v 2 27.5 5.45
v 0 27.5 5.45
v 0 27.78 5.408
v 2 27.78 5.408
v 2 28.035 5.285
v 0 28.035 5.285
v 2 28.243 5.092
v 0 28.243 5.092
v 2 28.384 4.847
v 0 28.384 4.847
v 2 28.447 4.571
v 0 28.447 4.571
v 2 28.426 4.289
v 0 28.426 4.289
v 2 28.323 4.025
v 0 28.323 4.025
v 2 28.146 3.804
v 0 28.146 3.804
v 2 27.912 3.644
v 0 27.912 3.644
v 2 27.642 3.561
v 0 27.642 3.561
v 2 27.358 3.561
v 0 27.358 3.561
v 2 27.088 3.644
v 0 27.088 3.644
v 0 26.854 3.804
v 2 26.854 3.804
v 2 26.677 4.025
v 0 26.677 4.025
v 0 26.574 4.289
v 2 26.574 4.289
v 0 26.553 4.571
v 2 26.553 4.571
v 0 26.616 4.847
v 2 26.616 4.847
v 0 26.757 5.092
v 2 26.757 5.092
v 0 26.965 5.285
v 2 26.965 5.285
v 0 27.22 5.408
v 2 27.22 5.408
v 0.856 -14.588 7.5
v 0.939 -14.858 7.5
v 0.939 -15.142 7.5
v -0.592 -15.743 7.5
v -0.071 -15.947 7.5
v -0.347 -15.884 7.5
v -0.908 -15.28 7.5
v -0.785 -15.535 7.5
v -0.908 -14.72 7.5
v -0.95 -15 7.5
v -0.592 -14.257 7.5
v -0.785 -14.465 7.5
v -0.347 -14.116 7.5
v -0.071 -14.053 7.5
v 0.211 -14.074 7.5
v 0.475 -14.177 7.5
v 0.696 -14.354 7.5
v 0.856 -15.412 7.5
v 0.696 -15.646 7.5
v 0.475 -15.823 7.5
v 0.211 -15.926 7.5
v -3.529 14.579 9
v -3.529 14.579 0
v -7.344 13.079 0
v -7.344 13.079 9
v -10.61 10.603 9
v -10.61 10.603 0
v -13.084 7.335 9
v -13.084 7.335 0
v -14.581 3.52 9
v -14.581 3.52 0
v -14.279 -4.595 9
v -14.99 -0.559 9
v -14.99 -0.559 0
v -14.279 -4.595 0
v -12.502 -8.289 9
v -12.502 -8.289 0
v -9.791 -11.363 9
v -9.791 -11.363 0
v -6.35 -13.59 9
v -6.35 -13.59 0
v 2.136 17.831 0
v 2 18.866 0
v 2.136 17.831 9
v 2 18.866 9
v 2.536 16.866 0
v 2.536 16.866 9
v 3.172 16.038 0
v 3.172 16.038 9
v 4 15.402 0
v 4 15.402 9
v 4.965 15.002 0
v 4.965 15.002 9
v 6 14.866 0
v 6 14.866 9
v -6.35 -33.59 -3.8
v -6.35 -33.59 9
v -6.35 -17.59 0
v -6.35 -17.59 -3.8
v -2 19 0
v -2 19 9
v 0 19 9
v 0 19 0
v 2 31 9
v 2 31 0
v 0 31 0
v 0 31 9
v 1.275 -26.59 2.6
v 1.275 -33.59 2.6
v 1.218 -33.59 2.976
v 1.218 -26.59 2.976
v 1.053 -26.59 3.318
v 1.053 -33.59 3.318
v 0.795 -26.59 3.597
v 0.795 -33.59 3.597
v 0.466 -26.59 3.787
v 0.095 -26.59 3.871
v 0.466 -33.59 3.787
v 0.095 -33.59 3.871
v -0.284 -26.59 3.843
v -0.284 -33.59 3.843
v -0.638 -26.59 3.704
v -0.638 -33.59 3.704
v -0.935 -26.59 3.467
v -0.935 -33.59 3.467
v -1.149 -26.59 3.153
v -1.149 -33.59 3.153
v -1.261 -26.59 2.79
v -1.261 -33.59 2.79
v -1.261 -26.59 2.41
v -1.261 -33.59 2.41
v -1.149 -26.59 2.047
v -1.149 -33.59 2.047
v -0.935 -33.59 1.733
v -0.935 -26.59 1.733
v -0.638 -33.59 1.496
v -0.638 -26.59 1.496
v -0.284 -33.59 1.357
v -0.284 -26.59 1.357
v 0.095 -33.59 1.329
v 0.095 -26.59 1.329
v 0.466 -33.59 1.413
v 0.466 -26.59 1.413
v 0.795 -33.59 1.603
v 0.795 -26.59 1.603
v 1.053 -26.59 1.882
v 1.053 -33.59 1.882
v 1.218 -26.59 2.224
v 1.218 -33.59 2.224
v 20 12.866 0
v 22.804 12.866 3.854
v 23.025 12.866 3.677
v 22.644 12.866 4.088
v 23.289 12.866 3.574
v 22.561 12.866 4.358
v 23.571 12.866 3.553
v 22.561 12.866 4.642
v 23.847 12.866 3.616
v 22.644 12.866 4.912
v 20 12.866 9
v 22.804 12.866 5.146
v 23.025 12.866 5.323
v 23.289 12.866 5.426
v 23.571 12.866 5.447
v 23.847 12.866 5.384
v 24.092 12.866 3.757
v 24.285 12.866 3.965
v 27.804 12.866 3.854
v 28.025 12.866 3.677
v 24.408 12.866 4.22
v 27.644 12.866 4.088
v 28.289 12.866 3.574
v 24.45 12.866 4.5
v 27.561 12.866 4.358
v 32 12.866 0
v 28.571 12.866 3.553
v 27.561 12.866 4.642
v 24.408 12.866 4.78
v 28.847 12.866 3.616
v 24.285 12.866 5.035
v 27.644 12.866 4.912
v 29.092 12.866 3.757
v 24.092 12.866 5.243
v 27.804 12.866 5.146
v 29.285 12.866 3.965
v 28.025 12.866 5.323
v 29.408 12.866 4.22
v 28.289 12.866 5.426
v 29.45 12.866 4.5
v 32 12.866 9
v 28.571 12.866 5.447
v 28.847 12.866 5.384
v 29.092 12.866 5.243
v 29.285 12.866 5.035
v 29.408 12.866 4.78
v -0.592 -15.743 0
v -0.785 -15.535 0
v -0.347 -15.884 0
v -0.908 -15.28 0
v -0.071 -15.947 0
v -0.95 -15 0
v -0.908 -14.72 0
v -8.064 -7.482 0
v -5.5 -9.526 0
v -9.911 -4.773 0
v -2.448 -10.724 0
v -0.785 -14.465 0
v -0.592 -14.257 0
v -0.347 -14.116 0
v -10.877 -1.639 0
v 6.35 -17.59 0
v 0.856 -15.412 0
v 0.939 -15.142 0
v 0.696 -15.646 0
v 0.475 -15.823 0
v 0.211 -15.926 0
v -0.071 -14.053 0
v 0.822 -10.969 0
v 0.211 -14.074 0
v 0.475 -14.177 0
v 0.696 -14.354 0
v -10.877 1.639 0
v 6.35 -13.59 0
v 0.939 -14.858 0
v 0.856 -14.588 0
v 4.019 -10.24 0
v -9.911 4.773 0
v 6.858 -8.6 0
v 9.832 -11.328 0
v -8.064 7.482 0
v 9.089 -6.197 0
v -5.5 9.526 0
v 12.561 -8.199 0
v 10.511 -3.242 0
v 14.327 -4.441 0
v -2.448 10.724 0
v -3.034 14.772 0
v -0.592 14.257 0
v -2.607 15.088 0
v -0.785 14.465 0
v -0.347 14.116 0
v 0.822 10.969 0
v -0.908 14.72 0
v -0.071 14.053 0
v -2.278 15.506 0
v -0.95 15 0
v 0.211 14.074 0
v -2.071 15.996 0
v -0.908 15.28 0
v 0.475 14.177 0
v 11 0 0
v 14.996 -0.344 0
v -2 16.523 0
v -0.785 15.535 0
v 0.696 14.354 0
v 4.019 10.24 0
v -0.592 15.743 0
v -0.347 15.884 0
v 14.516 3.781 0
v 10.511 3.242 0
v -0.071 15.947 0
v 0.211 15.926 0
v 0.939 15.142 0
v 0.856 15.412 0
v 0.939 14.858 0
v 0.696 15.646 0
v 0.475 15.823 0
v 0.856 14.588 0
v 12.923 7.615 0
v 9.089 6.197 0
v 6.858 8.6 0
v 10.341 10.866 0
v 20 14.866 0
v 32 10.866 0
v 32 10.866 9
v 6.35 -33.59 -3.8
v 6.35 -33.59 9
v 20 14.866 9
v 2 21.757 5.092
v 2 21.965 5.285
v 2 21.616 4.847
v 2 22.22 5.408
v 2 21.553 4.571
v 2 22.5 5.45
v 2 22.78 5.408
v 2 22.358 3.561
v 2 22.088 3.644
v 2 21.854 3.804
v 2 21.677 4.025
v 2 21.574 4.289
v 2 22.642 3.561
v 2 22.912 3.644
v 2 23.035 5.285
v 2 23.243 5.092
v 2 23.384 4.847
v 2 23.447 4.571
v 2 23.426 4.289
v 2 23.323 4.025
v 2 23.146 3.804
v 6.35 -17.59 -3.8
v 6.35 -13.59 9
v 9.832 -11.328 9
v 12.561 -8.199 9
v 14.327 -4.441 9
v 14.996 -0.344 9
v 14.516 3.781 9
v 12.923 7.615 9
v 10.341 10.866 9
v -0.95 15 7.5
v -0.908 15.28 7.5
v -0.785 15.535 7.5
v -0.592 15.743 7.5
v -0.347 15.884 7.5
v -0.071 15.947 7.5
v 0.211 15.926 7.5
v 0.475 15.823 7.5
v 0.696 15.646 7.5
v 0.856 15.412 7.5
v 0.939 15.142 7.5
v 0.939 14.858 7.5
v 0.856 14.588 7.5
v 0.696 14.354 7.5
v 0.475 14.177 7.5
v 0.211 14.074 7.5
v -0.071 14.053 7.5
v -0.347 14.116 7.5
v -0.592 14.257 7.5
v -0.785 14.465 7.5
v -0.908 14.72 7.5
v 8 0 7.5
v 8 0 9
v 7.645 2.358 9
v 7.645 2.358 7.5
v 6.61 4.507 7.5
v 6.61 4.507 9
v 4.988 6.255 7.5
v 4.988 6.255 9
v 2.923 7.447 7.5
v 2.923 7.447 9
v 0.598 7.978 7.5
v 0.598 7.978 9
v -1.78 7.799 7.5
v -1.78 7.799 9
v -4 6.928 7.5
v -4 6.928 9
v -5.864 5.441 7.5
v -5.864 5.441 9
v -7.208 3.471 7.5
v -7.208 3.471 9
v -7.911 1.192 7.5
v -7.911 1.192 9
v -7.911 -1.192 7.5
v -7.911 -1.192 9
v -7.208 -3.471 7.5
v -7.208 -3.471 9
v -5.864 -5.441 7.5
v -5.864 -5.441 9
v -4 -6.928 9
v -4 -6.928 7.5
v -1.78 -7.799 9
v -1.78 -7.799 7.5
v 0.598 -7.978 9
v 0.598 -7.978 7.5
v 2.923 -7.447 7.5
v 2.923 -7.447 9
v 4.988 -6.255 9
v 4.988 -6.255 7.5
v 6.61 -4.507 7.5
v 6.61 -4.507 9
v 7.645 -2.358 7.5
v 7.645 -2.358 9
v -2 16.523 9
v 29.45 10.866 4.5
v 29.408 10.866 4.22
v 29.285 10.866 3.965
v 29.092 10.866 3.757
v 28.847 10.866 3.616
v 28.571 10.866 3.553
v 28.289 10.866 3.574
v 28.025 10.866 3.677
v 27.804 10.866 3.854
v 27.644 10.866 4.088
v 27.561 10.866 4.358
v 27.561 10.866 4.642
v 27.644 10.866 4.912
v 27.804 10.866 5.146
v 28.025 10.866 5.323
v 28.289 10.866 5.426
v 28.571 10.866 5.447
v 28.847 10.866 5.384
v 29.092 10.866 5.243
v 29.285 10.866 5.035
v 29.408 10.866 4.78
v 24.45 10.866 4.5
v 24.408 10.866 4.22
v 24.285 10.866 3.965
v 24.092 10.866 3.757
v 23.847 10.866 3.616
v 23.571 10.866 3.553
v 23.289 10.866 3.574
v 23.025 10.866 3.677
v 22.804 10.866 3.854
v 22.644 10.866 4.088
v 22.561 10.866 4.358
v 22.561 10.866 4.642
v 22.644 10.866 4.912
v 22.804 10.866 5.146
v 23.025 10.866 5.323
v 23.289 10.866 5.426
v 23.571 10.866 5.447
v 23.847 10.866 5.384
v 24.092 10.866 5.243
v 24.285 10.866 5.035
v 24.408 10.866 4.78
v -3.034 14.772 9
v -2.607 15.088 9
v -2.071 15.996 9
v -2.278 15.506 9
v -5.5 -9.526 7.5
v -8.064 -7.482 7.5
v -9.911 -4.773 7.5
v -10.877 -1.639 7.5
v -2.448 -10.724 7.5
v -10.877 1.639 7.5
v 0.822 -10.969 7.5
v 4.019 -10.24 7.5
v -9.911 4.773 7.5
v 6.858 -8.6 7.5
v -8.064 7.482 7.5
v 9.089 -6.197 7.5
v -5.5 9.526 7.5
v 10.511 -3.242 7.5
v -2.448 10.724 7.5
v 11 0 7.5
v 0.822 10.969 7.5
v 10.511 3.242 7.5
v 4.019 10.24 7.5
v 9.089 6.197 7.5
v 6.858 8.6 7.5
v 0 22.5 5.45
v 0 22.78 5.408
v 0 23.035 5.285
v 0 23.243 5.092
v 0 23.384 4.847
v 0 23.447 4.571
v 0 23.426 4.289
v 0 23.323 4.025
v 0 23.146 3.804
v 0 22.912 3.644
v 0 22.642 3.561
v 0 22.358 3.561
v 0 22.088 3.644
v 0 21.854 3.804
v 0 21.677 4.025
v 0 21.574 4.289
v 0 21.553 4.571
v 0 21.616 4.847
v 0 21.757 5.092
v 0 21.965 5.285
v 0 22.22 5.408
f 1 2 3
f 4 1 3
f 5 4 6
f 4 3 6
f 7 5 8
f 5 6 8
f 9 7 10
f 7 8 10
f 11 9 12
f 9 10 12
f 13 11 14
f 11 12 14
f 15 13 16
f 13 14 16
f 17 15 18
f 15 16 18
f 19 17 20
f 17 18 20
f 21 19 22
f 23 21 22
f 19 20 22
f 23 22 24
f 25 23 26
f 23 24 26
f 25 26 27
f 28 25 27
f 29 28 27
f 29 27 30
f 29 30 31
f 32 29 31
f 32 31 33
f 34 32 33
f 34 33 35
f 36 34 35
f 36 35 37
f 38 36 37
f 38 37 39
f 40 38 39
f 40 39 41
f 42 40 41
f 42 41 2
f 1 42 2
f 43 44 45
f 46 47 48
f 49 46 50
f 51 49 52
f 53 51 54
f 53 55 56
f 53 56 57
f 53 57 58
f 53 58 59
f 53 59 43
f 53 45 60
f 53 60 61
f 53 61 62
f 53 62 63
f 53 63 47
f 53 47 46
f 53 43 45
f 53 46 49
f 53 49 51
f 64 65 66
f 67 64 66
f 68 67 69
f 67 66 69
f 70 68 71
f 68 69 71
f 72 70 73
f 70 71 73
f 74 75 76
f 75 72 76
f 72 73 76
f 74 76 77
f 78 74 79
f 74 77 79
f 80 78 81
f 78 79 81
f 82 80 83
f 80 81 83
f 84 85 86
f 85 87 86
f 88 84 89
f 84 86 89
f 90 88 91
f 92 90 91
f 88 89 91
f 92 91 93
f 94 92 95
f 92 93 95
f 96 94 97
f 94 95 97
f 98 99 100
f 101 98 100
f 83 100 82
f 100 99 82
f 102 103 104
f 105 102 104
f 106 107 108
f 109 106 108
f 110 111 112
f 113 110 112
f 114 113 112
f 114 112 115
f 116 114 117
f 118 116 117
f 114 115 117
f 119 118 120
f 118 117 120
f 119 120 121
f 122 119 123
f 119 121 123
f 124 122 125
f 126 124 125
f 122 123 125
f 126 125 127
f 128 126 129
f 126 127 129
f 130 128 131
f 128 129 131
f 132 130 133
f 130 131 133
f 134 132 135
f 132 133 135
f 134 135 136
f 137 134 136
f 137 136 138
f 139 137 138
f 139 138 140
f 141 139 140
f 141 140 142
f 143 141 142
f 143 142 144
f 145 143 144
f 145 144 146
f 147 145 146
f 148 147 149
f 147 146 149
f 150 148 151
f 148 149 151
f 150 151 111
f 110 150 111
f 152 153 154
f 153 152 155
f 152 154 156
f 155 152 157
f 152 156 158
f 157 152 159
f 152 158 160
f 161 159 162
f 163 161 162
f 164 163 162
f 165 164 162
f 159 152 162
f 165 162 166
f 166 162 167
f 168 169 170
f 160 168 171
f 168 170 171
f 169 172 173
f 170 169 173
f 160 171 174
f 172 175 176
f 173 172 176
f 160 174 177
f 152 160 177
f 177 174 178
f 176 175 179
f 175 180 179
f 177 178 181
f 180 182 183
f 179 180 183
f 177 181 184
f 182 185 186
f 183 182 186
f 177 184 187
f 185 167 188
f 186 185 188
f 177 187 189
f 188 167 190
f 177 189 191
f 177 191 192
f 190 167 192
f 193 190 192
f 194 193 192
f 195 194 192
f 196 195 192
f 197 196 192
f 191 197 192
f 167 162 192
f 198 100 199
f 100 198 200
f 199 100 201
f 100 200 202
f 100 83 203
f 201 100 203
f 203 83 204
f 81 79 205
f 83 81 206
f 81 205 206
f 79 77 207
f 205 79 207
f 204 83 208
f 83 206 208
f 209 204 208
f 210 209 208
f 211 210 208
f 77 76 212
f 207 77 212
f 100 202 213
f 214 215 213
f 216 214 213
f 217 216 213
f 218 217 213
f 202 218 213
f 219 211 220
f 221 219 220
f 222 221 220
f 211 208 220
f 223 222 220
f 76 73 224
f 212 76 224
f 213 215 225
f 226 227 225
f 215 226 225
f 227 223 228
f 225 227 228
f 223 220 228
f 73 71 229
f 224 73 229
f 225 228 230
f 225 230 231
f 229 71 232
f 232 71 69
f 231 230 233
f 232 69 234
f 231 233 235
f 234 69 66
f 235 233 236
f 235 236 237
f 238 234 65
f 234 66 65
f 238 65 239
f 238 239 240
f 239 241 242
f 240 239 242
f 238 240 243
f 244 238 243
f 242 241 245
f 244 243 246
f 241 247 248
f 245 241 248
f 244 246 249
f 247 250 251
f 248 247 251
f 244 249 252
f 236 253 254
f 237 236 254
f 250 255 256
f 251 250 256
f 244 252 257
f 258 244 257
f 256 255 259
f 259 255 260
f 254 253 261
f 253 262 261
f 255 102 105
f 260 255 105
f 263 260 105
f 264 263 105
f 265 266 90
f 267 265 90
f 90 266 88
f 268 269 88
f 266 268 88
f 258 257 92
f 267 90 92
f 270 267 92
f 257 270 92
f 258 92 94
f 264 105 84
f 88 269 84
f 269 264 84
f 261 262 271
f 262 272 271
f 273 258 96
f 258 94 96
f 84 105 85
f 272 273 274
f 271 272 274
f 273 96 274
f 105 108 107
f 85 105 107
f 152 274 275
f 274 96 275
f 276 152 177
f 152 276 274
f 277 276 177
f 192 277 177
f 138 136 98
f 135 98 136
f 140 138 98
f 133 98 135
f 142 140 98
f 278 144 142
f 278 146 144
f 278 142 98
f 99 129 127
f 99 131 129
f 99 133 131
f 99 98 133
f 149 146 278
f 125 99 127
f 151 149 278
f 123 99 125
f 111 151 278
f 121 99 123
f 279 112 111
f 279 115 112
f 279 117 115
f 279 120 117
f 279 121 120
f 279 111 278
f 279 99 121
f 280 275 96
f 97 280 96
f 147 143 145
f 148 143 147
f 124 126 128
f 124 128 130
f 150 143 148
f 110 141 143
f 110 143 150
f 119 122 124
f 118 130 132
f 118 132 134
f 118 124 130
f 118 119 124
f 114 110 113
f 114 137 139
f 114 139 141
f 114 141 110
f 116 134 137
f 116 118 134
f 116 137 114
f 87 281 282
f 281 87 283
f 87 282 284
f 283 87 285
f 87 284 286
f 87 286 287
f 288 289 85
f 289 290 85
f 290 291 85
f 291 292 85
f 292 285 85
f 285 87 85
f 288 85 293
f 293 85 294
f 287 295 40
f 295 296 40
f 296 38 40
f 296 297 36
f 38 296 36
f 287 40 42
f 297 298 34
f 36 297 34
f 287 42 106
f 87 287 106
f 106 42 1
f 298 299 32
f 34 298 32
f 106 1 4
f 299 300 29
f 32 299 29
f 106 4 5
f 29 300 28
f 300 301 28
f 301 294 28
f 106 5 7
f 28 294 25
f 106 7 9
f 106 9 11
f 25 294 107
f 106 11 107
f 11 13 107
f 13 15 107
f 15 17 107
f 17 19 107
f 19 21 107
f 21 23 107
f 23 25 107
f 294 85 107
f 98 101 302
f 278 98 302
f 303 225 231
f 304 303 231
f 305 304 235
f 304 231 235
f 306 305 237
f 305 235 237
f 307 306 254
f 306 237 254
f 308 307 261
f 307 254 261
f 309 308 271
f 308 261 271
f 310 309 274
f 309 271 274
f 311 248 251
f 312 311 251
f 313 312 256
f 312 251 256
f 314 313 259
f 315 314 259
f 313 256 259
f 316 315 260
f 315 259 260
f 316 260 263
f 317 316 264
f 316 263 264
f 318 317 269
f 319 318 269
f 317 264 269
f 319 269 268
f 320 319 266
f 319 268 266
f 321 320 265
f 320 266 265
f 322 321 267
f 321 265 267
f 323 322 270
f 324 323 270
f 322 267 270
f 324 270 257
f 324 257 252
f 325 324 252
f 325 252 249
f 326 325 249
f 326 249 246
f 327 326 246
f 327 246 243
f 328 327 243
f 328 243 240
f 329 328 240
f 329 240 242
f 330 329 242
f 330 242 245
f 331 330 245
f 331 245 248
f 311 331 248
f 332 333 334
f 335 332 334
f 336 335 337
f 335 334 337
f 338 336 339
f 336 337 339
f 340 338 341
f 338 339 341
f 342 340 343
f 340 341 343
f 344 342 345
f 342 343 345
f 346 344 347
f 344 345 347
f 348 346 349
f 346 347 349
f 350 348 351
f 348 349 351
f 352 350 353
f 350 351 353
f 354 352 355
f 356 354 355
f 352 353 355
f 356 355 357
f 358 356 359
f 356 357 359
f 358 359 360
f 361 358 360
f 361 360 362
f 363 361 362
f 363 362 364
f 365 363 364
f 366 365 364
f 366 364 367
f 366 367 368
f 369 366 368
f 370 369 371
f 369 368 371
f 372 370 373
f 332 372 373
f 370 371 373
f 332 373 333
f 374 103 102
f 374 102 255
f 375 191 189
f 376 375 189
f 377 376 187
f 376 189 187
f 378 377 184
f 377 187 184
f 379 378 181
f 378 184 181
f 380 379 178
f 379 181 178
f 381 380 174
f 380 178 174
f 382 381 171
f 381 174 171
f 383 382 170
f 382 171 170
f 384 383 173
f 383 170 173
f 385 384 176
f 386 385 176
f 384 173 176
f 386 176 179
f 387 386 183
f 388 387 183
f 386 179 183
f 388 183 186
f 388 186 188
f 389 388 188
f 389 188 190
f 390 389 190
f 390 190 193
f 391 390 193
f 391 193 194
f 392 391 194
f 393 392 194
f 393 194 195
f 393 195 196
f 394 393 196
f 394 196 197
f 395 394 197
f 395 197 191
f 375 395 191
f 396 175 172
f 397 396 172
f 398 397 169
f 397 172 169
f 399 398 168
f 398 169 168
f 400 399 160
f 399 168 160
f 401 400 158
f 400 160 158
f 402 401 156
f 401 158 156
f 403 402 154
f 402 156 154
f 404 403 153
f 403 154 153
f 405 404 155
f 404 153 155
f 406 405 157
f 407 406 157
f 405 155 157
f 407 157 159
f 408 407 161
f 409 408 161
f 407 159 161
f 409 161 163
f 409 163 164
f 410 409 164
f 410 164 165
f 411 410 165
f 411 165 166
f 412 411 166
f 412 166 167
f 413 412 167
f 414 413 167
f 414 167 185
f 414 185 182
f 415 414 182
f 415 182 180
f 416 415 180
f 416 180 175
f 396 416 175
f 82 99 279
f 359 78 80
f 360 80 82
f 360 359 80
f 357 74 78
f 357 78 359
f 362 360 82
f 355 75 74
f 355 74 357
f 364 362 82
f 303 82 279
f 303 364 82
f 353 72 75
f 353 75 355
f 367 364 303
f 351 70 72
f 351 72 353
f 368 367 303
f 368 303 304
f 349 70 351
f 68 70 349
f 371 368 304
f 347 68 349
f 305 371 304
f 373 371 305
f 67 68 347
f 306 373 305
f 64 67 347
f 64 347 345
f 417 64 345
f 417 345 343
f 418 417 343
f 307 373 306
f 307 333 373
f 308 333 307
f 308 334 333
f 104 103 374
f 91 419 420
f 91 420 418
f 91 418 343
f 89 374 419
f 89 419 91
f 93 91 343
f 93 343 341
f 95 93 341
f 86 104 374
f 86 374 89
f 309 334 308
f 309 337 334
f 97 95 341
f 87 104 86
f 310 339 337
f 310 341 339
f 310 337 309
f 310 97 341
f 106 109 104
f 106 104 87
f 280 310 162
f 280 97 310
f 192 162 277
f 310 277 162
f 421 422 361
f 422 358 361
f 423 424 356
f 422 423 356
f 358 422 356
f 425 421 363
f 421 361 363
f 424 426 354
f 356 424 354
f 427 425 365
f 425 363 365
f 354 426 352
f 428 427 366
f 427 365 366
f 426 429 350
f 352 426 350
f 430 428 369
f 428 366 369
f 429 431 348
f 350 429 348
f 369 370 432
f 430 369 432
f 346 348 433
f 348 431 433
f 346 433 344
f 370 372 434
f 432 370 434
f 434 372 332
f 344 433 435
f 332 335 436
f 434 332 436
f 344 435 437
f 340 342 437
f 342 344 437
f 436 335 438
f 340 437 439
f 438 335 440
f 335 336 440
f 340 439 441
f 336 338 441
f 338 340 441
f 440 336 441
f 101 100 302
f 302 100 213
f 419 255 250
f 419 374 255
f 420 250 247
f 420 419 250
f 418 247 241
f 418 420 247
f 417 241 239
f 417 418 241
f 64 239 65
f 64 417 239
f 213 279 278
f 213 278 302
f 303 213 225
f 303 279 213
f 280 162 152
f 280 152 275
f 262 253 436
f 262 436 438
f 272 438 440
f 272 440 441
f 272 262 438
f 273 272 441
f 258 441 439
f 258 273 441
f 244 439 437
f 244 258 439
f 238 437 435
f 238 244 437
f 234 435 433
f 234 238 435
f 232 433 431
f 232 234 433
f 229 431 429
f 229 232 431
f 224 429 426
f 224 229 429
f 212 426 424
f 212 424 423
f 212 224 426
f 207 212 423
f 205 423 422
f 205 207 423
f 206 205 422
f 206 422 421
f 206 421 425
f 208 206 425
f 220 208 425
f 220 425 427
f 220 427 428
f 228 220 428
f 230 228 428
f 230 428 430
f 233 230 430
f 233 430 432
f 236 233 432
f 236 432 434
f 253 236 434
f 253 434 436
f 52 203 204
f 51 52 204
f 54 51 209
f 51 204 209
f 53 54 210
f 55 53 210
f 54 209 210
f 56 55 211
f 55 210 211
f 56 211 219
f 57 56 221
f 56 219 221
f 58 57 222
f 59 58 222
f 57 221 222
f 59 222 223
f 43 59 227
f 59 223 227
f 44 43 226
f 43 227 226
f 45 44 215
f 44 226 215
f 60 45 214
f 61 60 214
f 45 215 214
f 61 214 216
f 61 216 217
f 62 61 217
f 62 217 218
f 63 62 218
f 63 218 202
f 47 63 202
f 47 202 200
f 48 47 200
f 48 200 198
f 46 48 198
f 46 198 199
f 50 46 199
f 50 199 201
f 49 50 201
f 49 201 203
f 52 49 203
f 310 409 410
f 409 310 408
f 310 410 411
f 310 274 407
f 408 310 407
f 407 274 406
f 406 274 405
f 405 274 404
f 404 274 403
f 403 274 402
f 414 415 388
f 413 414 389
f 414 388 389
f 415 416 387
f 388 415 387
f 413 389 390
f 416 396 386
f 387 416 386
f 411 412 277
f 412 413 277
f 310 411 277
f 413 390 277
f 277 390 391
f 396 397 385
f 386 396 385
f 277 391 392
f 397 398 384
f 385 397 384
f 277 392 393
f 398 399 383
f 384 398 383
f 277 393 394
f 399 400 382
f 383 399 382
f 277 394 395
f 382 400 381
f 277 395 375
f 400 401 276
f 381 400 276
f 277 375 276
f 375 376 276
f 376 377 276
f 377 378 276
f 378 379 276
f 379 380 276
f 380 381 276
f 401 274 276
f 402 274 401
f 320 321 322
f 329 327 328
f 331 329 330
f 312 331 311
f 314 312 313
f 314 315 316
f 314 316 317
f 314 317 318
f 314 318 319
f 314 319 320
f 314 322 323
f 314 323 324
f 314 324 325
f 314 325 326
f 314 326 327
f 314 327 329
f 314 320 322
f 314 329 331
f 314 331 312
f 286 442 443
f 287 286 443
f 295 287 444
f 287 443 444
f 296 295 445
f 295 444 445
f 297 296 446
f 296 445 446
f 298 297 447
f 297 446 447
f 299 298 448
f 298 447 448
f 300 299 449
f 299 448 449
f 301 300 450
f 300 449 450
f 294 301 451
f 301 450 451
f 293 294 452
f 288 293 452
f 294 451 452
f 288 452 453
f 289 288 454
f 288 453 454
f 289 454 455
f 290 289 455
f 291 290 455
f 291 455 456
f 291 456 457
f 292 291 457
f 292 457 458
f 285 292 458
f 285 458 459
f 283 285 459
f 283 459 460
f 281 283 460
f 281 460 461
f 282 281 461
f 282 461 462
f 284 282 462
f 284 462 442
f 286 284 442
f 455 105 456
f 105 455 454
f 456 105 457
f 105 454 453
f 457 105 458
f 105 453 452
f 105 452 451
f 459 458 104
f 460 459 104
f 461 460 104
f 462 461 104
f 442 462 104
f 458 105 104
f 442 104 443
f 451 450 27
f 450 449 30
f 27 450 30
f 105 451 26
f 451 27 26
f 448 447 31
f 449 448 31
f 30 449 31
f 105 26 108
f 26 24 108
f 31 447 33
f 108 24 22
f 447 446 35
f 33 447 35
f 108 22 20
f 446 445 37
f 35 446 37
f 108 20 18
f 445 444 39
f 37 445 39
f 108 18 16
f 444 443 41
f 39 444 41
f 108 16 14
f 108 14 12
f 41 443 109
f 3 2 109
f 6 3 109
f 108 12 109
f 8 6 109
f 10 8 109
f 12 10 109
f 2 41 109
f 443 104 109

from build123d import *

# Parameters (mm, degrees)
SKETCH2_R           = 15
SKETCH2_R_2         = 11
BOSS_EXTRUDE1_DEPTH = 9
BOSS_EXTRUDE2_DEPTH = 9
SKETCH4_W           = 12.7
SKETCH4_H           = 16
BOSS_EXTRUDE3_DEPTH = 3.8
SKETCH5_R           = 1.275
CUT_EXTRUDE1_DEPTH  = 7
SKETCH6_R           = 11
SKETCH6_R_2         = 8
BOSS_EXTRUDE4_DEPTH = 1.5
BOSS_EXTRUDE5_DEPTH = 9
SKETCH8_W           = 12
SKETCH8_H           = 2
SKETCH8_W_2         = 2
SKETCH8_H_2         = 12
CUT_EXTRUDE2_DEPTH  = 13.8
CUT_EXTRUDE3_REACH  = 34
SKETCH9_R           = 0.95
CUT_EXTRUDE4_REACH  = 48.456
SKETCH10_R          = 0.95
FILLET1_R           = 4
FILLET3_R           = 2
SKETCH11_R          = 11
BOSS_EXTRUDE6_DEPTH = 1.5
SKETCH13_R          = 0.95
CUT_EXTRUDE5_DEPTH  = 9
FILLET2_R           = 1


with BuildPart() as part:
    # Sketch2 → Boss-Extrude1 (new body)
    with BuildSketch(Plane.XY):
        Circle(SKETCH2_R)
        Circle(SKETCH2_R_2, mode=Mode.SUBTRACT)
    extrude(amount=BOSS_EXTRUDE1_DEPTH)

    # Sketch3 → Boss-Extrude2 (add)
    with BuildSketch(Plane.XY):
        with BuildLine():
            Line((-6.35, -13.589610002), (-6.35, -33.589610002))
            Line((-6.35, -33.589610002), (6.35, -33.589610002))
            Line((6.35, -33.589610002), (6.35, -13.589610002))
            ThreePointArc((6.35, -13.589610002), (0, -15), (-6.35, -13.589610002))
        make_face()
    extrude(amount=BOSS_EXTRUDE2_DEPTH)

    # Sketch4 → Boss-Extrude3 (add)
    with BuildSketch(Plane.XY):
        with Locations((0, -25.589610002)):
            Rectangle(SKETCH4_W, SKETCH4_H)
    extrude(amount=-BOSS_EXTRUDE3_DEPTH)

    # Sketch5 → Cut-Extrude1 (cut)
    with BuildSketch(Plane.XZ.offset(33.589610002)):
        with Locations((0, 2.6)):
            Circle(SKETCH5_R)
    extrude(amount=-CUT_EXTRUDE1_DEPTH, mode=Mode.SUBTRACT)

    # Sketch6 → Boss-Extrude4 (add)
    with BuildSketch(Plane.XY.offset(9)):
        Circle(SKETCH6_R)
        Circle(SKETCH6_R_2, mode=Mode.SUBTRACT)
    extrude(amount=-BOSS_EXTRUDE4_DEPTH)

    # Sketch7 → Boss-Extrude5 (add)
    with BuildSketch(Plane.XY):
        Polygon((-2, 14.866068747), (2, 10.866068747), (32, 10.866068747), (32, 14.866068747), (2, 14.866068747), (2, 31), (-2, 31), align=None)
    extrude(amount=BOSS_EXTRUDE5_DEPTH)

    # Sketch8 → Cut-Extrude2 (cut, through all)
    with BuildSketch(Plane.XY.offset(9)):
        with Locations((26, 13.866068747)):
            Rectangle(SKETCH8_W, SKETCH8_H)
        with Locations((-1, 25)):
            Rectangle(SKETCH8_W_2, SKETCH8_H_2)
    extrude(amount=-CUT_EXTRUDE2_DEPTH, mode=Mode.SUBTRACT)

    # Sketch9 → Cut-Extrude3 (cut, up to next)
    with BuildSketch(Plane.ZY, mode=Mode.PRIVATE) as cut_extrude3_sk1:
        with Locations((4.5, 27.5)):
            Circle(SKETCH9_R)
    cut_extrude3_tool1 = extrude(cut_extrude3_sk1.sketch, amount=-CUT_EXTRUDE3_REACH, mode=Mode.PRIVATE) & part.part
    add(cut_extrude3_tool1.solids().sort_by_distance((0, 27.5, 4.5))[0], mode=Mode.SUBTRACT)
    # Sketch9 → Cut-Extrude3 (cut, up to next)
    with BuildSketch(Plane.ZY, mode=Mode.PRIVATE) as cut_extrude3_sk2:
        with Locations((4.5, 22.5)):
            Circle(SKETCH9_R)
    cut_extrude3_tool2 = extrude(cut_extrude3_sk2.sketch, amount=-CUT_EXTRUDE3_REACH, mode=Mode.PRIVATE) & part.part
    add(cut_extrude3_tool2.solids().sort_by_distance((0, 22.5, 4.5))[0], mode=Mode.SUBTRACT)

    # Sketch10 → Cut-Extrude4 (cut, up to next)
    with BuildSketch(Plane(origin=(0, 12.866068747, 0), x_dir=(1, 0, 0), z_dir=(0, 1, 0)), mode=Mode.PRIVATE) as cut_extrude4_sk1:
        with Locations((23.5, -4.5)):
            Circle(SKETCH10_R)
    cut_extrude4_tool1 = extrude(cut_extrude4_sk1.sketch, amount=-CUT_EXTRUDE4_REACH, mode=Mode.PRIVATE) & part.part
    add(cut_extrude4_tool1.solids().sort_by_distance((23.5, 12.866069, 4.5))[0], mode=Mode.SUBTRACT)
    # Sketch10 → Cut-Extrude4 (cut, up to next)
    with BuildSketch(Plane(origin=(0, 12.866068747, 0), x_dir=(1, 0, 0), z_dir=(0, 1, 0)), mode=Mode.PRIVATE) as cut_extrude4_sk2:
        with Locations((28.5, -4.5)):
            Circle(SKETCH10_R)
    cut_extrude4_tool2 = extrude(cut_extrude4_sk2.sketch, amount=-CUT_EXTRUDE4_REACH, mode=Mode.PRIVATE) & part.part
    add(cut_extrude4_tool2.solids().sort_by_distance((28.5, 12.866069, 4.5))[0], mode=Mode.SUBTRACT)

    # Fillet1
    fillet1_edges = [part.edges().sort_by_distance(p)[0] for p in [
        (2, 14.866068747, 4.5),
    ]]
    fillet(fillet1_edges, radius=FILLET1_R)

    # Fillet3
    fillet3_edges = [part.edges().sort_by_distance(p)[0] for p in [
        (-2, 14.866068747, 4.5),
    ]]
    fillet(fillet3_edges, radius=FILLET3_R)


with BuildPart() as body_2:
    # Sketch11 → Boss-Extrude6 (new body)
    with BuildSketch(Plane(origin=(0, 0, 0), x_dir=(-1, 0, 0), z_dir=(0, 0, -1))):
        with BuildLine():
            Line((-6, 14.866068747), (-10.340626189, 10.866068747))
            ThreePointArc((-10.340626189, 10.866068747), (-14.804198945, -2.415718027), (-6.35, -13.589610002))
            Line((-6.35, -13.589610002), (-6.35, -17.589610002))
            Line((-6.35, -17.589610002), (6.35, -17.589610002))
            Line((6.35, -17.589610002), (6.35, -13.589610002))
            ThreePointArc((6.35, -13.589610002), (14.92536147, 1.49451831), (3.529411765, 14.578863213))
            ThreePointArc((3.529411765, 14.578863213), (2.428189504, 15.286017757), (2, 16.522711642))
            Line((2, 16.522711642), (2, 19))
            Line((2, 19), (0, 19))
            Line((0, 19), (-2, 19))
            Line((-2, 19), (-2, 18.866068747))
            ThreePointArc((-2, 18.866068747), (-3.171572875, 16.037641623), (-6, 14.866068747))
        make_face()
        Circle(SKETCH11_R, mode=Mode.SUBTRACT)
    extrude(amount=BOSS_EXTRUDE6_DEPTH)


with BuildPart() as cut_extrude5_tool:
    # Sketch13 → Cut-Extrude5 (new body)
    with BuildSketch(Plane(origin=(0, 0, -1.5), x_dir=(-1, 0, 0), z_dir=(0, 0, -1))):
        with Locations((0, 15)):
            Circle(SKETCH13_R)
        with Locations((0, -15)):
            Circle(SKETCH13_R)
    extrude(amount=-CUT_EXTRUDE5_DEPTH)


with BuildPart() as part_1:
    add(part.part)

    # Cut-Extrude5: cut by cut_extrude5_tool
    add(cut_extrude5_tool.part, mode=Mode.SUBTRACT)


with BuildPart() as body_2_1:
    add(body_2.part)

    # Cut-Extrude5: cut by cut_extrude5_tool
    add(cut_extrude5_tool.part, mode=Mode.SUBTRACT)

    # Fillet2
    fillet2_edges = [body_2_1.edges().sort_by_distance(p)[0] for p in [
        (0, 19, -1.5),
    ]]
    fillet(fillet2_edges, radius=FILLET2_R)


solid = part_1.part
